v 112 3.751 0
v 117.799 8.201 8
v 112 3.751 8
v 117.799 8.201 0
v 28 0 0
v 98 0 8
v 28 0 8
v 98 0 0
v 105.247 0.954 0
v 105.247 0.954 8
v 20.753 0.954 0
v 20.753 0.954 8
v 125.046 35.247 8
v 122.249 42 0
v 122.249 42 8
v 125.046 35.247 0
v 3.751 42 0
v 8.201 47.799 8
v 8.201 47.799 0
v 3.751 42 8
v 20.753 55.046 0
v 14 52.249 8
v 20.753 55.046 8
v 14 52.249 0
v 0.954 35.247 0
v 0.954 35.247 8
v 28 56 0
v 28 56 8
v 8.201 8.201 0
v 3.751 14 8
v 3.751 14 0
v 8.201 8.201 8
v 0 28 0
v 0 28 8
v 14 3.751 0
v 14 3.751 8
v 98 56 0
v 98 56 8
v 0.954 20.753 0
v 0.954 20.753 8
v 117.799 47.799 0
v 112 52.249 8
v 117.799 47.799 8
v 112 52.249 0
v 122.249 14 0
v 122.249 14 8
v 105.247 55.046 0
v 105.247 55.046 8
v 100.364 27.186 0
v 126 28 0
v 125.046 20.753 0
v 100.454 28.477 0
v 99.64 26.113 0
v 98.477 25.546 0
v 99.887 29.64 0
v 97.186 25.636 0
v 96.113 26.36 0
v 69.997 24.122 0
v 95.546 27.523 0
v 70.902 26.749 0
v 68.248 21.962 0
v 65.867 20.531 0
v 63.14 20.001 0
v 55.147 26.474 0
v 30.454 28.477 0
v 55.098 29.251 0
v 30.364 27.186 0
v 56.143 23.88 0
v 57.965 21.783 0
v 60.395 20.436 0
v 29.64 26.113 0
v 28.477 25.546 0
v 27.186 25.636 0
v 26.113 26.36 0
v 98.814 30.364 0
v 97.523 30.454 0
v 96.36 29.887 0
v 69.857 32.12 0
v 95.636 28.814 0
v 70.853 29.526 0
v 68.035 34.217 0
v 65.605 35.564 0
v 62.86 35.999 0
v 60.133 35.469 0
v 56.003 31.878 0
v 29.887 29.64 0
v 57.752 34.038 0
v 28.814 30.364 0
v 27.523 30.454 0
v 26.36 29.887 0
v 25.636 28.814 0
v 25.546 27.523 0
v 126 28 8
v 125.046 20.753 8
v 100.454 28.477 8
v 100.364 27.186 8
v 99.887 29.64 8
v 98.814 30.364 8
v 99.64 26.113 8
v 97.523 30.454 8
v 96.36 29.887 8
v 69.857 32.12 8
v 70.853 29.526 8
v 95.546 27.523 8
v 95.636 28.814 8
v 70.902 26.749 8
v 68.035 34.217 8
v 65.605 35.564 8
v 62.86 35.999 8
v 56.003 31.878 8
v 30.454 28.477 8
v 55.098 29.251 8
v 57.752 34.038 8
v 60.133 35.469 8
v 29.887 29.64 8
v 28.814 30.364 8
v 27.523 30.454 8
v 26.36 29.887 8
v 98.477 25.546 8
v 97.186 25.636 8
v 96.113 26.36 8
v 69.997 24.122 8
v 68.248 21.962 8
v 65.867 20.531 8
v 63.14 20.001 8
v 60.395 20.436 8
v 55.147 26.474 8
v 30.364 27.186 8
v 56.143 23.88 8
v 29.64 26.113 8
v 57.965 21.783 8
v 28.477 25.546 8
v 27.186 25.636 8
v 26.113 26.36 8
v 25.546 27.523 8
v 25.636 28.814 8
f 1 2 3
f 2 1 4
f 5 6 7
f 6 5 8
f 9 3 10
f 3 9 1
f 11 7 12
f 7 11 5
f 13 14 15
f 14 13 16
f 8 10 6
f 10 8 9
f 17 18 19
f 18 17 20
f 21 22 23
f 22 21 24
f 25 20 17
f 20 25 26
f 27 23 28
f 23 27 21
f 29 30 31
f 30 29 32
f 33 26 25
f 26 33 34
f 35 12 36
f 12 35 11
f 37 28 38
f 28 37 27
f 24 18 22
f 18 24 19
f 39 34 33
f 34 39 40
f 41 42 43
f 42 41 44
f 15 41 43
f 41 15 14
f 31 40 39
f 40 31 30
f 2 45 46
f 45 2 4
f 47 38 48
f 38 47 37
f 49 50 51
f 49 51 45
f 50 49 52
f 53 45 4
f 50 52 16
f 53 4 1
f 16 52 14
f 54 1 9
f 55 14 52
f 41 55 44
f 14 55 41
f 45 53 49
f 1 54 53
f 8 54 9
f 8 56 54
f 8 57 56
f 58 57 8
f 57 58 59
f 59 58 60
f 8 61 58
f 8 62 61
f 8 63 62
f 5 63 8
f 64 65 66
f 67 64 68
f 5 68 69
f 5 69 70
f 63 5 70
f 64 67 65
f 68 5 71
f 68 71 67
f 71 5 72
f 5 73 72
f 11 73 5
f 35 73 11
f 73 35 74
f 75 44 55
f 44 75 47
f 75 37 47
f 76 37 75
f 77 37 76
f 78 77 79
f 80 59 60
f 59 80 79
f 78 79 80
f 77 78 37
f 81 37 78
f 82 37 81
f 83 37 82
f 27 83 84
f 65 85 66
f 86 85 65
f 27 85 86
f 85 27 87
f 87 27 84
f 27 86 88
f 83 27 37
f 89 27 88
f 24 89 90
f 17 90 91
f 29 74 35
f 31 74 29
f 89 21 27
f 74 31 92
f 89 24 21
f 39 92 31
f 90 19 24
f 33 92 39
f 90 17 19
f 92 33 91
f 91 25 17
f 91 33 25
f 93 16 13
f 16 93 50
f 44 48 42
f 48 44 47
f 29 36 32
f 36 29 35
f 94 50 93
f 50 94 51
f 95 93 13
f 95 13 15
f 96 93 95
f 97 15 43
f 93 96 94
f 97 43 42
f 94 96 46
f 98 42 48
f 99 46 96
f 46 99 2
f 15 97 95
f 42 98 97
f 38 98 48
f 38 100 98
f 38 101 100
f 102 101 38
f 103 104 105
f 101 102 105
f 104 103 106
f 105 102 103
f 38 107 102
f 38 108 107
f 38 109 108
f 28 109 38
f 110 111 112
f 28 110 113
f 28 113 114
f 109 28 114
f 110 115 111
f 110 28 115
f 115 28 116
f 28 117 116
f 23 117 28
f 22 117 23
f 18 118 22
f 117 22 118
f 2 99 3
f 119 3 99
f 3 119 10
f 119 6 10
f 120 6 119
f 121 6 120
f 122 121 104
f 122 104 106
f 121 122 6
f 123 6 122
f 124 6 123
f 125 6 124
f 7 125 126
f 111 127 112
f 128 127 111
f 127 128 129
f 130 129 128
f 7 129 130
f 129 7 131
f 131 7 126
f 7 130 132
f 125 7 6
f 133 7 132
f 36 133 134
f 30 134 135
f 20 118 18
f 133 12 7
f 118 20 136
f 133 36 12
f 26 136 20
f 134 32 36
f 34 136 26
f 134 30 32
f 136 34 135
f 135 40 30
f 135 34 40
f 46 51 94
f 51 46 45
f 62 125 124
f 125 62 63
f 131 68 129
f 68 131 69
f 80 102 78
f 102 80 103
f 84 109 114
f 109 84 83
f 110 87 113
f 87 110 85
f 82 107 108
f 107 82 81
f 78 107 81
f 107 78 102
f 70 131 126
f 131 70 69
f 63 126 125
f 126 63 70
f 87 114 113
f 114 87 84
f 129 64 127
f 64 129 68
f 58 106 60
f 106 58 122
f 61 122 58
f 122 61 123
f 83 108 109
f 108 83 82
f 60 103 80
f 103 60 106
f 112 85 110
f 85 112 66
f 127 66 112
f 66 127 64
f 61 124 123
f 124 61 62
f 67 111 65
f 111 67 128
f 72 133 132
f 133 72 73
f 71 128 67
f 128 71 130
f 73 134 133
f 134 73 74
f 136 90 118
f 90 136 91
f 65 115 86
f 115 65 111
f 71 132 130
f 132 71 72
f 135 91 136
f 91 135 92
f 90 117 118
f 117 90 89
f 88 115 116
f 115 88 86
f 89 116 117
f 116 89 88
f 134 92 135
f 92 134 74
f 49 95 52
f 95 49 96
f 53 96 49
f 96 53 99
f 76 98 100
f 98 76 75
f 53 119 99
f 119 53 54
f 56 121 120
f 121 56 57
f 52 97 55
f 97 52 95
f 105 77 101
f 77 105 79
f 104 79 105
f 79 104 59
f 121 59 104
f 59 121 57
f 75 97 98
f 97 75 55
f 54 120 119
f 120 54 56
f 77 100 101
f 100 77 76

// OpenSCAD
$fn = 32;

// ----------------------------------------------------------------------
// Spacer plate: obround span 70, caps R28
// ----------------------------------------------------------------------

// --- parameters (mm) ---
bore_r = 8;               // centre bore radius
bolt_r = 2.5;             // bolt hole radius
plate_t = 8;              // plate thickness, Z (extrusion height)
span = 70;                // obround span
cap_r = 28;               // cap radius

profile = [[28, 56], [20.753, 55.046], [14, 52.249], [8.201, 47.799], [3.751, 42], [0.954, 35.247], [0, 28], [0.954, 20.753], [3.751, 14], [8.201, 8.201], [14, 3.751], [20.753, 0.954], [28, 0], [98, 0], [105.247, 0.954], [112, 3.751], [117.799, 8.201], [122.249, 14], [125.046, 20.753], [126, 28], [125.046, 35.247], [122.249, 42], [117.799, 47.799], [112, 52.249], [105.247, 55.046], [98, 56]];  // primary outline, 26 points, counter clockwise
void_1 = [[70.853, 29.526], [69.857, 32.12], [68.035, 34.217], [65.605, 35.564], [62.86, 35.999], [60.133, 35.469], [57.752, 34.038], [56.003, 31.878], [55.098, 29.251], [55.147, 26.474], [56.143, 23.88], [57.965, 21.783], [60.395, 20.436], [63.14, 20.001], [65.867, 20.531], [68.248, 21.962], [69.997, 24.122], [70.902, 26.749]];  // centre bore, 18 points
void_2 = [[30.454, 28.477], [29.887, 29.64], [28.814, 30.364], [27.523, 30.454], [26.36, 29.887], [25.636, 28.814], [25.546, 27.523], [26.113, 26.36], [27.186, 25.636], [28.477, 25.546], [29.64, 26.113], [30.364, 27.186]];  // end hole, 12 points
void_3 = [[100.454, 28.477], [99.887, 29.64], [98.814, 30.364], [97.523, 30.454], [96.36, 29.887], [95.636, 28.814], [95.546, 27.523], [96.113, 26.36], [97.186, 25.636], [98.477, 25.546], [99.64, 26.113], [100.364, 27.186]];  // end hole, 12 points

// --- the one profile operation ---
difference() {
  linear_extrude(height = plate_t) polygon(points = profile);
  translate([0, 0, -1])
    linear_extrude(height = plate_t + 2) polygon(points = void_1);
  translate([0, 0, -1])
    linear_extrude(height = plate_t + 2) polygon(points = void_2);
  translate([0, 0, -1])
    linear_extrude(height = plate_t + 2) polygon(points = void_3);
}
